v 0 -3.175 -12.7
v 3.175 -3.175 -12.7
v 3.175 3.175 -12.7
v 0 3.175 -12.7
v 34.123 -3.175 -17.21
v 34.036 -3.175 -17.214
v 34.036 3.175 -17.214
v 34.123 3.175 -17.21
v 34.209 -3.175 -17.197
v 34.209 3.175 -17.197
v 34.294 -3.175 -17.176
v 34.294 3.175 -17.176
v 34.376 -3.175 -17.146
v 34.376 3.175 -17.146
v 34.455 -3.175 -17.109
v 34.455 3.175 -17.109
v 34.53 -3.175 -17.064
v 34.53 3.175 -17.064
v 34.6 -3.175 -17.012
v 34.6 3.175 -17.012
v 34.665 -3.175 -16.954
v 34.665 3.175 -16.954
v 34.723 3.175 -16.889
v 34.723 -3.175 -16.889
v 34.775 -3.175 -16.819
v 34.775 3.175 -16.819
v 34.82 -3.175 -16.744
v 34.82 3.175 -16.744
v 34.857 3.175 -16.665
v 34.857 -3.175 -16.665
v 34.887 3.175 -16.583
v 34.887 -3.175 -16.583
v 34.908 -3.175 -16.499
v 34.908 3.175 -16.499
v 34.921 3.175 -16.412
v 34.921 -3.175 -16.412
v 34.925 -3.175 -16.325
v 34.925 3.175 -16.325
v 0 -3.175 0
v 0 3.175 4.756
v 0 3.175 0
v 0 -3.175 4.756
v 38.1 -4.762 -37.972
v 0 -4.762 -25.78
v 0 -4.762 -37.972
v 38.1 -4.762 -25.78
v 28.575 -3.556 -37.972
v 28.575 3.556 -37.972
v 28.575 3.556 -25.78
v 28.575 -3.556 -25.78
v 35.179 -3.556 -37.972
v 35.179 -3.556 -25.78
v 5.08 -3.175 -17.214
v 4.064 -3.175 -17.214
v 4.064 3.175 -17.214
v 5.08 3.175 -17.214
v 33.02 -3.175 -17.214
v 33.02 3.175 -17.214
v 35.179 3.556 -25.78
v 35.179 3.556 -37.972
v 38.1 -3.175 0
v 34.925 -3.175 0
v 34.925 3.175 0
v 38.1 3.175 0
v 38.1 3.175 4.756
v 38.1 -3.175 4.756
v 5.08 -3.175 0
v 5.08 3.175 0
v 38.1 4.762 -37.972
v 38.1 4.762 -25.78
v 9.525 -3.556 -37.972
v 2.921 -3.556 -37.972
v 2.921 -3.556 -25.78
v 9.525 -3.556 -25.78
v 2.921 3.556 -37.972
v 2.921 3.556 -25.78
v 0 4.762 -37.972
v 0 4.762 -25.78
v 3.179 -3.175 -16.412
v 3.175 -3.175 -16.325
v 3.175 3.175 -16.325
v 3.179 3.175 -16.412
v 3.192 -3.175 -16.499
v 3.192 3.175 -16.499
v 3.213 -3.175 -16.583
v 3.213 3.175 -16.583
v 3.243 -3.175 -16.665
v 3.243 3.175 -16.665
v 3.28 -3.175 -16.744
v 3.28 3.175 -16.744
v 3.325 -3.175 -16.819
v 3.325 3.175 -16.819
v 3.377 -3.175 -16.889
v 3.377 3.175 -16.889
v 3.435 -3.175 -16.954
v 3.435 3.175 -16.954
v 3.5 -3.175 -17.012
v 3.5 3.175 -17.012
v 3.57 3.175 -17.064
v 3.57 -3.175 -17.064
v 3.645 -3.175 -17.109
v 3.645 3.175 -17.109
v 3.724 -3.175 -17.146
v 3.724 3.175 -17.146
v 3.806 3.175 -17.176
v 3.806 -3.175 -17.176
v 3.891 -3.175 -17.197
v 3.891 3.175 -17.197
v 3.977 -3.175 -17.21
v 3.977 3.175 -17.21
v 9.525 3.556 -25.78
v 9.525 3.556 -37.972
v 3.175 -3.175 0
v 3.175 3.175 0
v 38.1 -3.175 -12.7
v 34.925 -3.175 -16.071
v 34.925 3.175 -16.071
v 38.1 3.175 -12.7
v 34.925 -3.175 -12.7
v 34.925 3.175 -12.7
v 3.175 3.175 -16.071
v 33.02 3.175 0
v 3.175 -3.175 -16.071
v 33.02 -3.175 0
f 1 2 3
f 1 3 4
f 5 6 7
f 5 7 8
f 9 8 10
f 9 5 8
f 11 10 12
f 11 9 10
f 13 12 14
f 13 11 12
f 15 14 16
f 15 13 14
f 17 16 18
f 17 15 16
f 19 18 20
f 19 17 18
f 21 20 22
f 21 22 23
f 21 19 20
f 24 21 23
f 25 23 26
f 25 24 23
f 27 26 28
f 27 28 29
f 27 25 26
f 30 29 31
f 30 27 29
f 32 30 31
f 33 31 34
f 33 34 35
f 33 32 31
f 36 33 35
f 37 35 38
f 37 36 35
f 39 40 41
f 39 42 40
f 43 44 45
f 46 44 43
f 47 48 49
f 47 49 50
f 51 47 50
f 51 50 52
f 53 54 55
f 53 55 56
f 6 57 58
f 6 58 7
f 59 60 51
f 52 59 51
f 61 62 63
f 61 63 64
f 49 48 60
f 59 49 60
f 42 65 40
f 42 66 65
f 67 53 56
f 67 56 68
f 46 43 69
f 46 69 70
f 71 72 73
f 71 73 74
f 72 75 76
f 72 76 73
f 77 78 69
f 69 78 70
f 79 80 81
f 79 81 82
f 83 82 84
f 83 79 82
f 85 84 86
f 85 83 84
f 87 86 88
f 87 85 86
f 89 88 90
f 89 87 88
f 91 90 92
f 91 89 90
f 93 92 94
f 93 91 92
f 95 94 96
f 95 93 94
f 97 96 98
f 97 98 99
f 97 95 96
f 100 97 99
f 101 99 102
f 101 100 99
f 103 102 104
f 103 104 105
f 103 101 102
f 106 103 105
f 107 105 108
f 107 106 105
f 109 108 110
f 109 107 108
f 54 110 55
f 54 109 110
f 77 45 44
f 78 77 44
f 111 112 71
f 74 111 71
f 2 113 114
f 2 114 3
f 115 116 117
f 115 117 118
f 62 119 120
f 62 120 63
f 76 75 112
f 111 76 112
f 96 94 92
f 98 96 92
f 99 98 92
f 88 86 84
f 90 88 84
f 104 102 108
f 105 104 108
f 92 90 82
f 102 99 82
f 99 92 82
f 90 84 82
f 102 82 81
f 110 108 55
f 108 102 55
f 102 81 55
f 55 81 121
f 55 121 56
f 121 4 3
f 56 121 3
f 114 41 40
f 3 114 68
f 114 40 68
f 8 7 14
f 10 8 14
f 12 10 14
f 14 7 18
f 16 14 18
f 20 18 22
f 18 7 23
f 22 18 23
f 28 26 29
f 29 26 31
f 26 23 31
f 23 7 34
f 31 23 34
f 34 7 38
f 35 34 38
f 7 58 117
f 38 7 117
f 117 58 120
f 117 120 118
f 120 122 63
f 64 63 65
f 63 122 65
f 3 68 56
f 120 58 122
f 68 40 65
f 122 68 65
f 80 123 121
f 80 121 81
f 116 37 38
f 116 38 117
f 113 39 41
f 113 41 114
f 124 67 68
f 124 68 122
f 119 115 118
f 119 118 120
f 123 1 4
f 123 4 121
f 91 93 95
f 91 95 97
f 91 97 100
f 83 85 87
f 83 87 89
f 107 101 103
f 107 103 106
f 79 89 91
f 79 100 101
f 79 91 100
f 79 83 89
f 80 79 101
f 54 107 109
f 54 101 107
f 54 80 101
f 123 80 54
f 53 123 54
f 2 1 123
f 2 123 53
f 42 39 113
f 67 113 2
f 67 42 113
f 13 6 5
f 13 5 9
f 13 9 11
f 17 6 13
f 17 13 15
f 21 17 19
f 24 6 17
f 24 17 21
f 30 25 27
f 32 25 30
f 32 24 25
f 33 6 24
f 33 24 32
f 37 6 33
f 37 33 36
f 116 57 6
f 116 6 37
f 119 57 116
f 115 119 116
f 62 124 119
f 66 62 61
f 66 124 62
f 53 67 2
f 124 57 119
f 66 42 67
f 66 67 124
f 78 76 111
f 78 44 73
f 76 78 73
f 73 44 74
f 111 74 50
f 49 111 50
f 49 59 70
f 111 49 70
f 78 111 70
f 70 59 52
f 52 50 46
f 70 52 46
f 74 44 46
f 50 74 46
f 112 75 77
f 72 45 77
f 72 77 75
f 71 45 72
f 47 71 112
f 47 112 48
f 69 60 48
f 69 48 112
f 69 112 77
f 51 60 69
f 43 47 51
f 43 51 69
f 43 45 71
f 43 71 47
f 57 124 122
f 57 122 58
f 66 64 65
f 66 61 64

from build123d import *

# Parameters (mm, degrees)
F1_DEPTH = 3.175
F0_W     = 38.1
F0_H     = 12.192
F2_DEPTH = 4.7625
F3_W     = 6.604
F3_H     = 7.112
F4_DEPTH = 12.954


with BuildPart() as f1:
    # F0 (on Front) → F1 (new body, symmetric)
    with BuildSketch(Plane.XZ):
        with BuildLine():
            Line((0, 4.756242), (0, 0))
            Line((0, 0), (3.175, 0))
            Line((3.175, 0), (3.175, -12.7))
            Line((3.175, -12.7), (0, -12.7))
            Line((0, -12.7), (3.175, -16.071092))
            Line((3.175, -16.071092), (3.175, -16.325092))
            ThreePointArc((3.175, -16.325092), (3.435382, -16.95371), (4.064, -17.214092))
            Line((4.064, -17.214092), (5.08, -17.214092))
            Line((5.08, -17.214092), (5.08, 0))
            Line((5.08, 0), (33.02, 0))
            Line((33.02, 0), (33.02, -17.214092))
            Line((33.02, -17.214092), (34.036, -17.214092))
            ThreePointArc((34.036, -17.214092), (34.664618, -16.95371), (34.925, -16.325092))
            Line((34.925, -16.325092), (34.925, -16.071092))
            Line((34.925, -16.071092), (38.1, -12.7))
            Line((38.1, -12.7), (34.925, -12.7))
            Line((34.925, -12.7), (34.925, 0))
            Line((34.925, 0), (38.1, 0))
            Line((38.1, 0), (38.1, 4.756242))
            Line((38.1, 4.756242), (0, 4.756242))
        make_face()
    extrude(amount=F1_DEPTH, both=True)


with BuildPart() as f2:
    # F0 (on Front) → F2 (new body, symmetric)
    with BuildSketch(Plane.XZ):
        with Locations((19.05, -31.876074)):
            Rectangle(F0_W, F0_H)
    extrude(amount=F2_DEPTH, both=True)

    # F3 (on face) → F4 (cut)
    with BuildSketch(Plane(origin=(0, 0, -37.972074), x_dir=(1, 0, 0), z_dir=(0, 0, -1))):
        with Locations((6.223, 0)):
            Rectangle(F3_W, F3_H)
        with Locations((31.877, 0)):
            Rectangle(F3_W, F3_H)
    extrude(amount=-F4_DEPTH, mode=Mode.SUBTRACT)


solid = Compound([f1.part, f2.part])
